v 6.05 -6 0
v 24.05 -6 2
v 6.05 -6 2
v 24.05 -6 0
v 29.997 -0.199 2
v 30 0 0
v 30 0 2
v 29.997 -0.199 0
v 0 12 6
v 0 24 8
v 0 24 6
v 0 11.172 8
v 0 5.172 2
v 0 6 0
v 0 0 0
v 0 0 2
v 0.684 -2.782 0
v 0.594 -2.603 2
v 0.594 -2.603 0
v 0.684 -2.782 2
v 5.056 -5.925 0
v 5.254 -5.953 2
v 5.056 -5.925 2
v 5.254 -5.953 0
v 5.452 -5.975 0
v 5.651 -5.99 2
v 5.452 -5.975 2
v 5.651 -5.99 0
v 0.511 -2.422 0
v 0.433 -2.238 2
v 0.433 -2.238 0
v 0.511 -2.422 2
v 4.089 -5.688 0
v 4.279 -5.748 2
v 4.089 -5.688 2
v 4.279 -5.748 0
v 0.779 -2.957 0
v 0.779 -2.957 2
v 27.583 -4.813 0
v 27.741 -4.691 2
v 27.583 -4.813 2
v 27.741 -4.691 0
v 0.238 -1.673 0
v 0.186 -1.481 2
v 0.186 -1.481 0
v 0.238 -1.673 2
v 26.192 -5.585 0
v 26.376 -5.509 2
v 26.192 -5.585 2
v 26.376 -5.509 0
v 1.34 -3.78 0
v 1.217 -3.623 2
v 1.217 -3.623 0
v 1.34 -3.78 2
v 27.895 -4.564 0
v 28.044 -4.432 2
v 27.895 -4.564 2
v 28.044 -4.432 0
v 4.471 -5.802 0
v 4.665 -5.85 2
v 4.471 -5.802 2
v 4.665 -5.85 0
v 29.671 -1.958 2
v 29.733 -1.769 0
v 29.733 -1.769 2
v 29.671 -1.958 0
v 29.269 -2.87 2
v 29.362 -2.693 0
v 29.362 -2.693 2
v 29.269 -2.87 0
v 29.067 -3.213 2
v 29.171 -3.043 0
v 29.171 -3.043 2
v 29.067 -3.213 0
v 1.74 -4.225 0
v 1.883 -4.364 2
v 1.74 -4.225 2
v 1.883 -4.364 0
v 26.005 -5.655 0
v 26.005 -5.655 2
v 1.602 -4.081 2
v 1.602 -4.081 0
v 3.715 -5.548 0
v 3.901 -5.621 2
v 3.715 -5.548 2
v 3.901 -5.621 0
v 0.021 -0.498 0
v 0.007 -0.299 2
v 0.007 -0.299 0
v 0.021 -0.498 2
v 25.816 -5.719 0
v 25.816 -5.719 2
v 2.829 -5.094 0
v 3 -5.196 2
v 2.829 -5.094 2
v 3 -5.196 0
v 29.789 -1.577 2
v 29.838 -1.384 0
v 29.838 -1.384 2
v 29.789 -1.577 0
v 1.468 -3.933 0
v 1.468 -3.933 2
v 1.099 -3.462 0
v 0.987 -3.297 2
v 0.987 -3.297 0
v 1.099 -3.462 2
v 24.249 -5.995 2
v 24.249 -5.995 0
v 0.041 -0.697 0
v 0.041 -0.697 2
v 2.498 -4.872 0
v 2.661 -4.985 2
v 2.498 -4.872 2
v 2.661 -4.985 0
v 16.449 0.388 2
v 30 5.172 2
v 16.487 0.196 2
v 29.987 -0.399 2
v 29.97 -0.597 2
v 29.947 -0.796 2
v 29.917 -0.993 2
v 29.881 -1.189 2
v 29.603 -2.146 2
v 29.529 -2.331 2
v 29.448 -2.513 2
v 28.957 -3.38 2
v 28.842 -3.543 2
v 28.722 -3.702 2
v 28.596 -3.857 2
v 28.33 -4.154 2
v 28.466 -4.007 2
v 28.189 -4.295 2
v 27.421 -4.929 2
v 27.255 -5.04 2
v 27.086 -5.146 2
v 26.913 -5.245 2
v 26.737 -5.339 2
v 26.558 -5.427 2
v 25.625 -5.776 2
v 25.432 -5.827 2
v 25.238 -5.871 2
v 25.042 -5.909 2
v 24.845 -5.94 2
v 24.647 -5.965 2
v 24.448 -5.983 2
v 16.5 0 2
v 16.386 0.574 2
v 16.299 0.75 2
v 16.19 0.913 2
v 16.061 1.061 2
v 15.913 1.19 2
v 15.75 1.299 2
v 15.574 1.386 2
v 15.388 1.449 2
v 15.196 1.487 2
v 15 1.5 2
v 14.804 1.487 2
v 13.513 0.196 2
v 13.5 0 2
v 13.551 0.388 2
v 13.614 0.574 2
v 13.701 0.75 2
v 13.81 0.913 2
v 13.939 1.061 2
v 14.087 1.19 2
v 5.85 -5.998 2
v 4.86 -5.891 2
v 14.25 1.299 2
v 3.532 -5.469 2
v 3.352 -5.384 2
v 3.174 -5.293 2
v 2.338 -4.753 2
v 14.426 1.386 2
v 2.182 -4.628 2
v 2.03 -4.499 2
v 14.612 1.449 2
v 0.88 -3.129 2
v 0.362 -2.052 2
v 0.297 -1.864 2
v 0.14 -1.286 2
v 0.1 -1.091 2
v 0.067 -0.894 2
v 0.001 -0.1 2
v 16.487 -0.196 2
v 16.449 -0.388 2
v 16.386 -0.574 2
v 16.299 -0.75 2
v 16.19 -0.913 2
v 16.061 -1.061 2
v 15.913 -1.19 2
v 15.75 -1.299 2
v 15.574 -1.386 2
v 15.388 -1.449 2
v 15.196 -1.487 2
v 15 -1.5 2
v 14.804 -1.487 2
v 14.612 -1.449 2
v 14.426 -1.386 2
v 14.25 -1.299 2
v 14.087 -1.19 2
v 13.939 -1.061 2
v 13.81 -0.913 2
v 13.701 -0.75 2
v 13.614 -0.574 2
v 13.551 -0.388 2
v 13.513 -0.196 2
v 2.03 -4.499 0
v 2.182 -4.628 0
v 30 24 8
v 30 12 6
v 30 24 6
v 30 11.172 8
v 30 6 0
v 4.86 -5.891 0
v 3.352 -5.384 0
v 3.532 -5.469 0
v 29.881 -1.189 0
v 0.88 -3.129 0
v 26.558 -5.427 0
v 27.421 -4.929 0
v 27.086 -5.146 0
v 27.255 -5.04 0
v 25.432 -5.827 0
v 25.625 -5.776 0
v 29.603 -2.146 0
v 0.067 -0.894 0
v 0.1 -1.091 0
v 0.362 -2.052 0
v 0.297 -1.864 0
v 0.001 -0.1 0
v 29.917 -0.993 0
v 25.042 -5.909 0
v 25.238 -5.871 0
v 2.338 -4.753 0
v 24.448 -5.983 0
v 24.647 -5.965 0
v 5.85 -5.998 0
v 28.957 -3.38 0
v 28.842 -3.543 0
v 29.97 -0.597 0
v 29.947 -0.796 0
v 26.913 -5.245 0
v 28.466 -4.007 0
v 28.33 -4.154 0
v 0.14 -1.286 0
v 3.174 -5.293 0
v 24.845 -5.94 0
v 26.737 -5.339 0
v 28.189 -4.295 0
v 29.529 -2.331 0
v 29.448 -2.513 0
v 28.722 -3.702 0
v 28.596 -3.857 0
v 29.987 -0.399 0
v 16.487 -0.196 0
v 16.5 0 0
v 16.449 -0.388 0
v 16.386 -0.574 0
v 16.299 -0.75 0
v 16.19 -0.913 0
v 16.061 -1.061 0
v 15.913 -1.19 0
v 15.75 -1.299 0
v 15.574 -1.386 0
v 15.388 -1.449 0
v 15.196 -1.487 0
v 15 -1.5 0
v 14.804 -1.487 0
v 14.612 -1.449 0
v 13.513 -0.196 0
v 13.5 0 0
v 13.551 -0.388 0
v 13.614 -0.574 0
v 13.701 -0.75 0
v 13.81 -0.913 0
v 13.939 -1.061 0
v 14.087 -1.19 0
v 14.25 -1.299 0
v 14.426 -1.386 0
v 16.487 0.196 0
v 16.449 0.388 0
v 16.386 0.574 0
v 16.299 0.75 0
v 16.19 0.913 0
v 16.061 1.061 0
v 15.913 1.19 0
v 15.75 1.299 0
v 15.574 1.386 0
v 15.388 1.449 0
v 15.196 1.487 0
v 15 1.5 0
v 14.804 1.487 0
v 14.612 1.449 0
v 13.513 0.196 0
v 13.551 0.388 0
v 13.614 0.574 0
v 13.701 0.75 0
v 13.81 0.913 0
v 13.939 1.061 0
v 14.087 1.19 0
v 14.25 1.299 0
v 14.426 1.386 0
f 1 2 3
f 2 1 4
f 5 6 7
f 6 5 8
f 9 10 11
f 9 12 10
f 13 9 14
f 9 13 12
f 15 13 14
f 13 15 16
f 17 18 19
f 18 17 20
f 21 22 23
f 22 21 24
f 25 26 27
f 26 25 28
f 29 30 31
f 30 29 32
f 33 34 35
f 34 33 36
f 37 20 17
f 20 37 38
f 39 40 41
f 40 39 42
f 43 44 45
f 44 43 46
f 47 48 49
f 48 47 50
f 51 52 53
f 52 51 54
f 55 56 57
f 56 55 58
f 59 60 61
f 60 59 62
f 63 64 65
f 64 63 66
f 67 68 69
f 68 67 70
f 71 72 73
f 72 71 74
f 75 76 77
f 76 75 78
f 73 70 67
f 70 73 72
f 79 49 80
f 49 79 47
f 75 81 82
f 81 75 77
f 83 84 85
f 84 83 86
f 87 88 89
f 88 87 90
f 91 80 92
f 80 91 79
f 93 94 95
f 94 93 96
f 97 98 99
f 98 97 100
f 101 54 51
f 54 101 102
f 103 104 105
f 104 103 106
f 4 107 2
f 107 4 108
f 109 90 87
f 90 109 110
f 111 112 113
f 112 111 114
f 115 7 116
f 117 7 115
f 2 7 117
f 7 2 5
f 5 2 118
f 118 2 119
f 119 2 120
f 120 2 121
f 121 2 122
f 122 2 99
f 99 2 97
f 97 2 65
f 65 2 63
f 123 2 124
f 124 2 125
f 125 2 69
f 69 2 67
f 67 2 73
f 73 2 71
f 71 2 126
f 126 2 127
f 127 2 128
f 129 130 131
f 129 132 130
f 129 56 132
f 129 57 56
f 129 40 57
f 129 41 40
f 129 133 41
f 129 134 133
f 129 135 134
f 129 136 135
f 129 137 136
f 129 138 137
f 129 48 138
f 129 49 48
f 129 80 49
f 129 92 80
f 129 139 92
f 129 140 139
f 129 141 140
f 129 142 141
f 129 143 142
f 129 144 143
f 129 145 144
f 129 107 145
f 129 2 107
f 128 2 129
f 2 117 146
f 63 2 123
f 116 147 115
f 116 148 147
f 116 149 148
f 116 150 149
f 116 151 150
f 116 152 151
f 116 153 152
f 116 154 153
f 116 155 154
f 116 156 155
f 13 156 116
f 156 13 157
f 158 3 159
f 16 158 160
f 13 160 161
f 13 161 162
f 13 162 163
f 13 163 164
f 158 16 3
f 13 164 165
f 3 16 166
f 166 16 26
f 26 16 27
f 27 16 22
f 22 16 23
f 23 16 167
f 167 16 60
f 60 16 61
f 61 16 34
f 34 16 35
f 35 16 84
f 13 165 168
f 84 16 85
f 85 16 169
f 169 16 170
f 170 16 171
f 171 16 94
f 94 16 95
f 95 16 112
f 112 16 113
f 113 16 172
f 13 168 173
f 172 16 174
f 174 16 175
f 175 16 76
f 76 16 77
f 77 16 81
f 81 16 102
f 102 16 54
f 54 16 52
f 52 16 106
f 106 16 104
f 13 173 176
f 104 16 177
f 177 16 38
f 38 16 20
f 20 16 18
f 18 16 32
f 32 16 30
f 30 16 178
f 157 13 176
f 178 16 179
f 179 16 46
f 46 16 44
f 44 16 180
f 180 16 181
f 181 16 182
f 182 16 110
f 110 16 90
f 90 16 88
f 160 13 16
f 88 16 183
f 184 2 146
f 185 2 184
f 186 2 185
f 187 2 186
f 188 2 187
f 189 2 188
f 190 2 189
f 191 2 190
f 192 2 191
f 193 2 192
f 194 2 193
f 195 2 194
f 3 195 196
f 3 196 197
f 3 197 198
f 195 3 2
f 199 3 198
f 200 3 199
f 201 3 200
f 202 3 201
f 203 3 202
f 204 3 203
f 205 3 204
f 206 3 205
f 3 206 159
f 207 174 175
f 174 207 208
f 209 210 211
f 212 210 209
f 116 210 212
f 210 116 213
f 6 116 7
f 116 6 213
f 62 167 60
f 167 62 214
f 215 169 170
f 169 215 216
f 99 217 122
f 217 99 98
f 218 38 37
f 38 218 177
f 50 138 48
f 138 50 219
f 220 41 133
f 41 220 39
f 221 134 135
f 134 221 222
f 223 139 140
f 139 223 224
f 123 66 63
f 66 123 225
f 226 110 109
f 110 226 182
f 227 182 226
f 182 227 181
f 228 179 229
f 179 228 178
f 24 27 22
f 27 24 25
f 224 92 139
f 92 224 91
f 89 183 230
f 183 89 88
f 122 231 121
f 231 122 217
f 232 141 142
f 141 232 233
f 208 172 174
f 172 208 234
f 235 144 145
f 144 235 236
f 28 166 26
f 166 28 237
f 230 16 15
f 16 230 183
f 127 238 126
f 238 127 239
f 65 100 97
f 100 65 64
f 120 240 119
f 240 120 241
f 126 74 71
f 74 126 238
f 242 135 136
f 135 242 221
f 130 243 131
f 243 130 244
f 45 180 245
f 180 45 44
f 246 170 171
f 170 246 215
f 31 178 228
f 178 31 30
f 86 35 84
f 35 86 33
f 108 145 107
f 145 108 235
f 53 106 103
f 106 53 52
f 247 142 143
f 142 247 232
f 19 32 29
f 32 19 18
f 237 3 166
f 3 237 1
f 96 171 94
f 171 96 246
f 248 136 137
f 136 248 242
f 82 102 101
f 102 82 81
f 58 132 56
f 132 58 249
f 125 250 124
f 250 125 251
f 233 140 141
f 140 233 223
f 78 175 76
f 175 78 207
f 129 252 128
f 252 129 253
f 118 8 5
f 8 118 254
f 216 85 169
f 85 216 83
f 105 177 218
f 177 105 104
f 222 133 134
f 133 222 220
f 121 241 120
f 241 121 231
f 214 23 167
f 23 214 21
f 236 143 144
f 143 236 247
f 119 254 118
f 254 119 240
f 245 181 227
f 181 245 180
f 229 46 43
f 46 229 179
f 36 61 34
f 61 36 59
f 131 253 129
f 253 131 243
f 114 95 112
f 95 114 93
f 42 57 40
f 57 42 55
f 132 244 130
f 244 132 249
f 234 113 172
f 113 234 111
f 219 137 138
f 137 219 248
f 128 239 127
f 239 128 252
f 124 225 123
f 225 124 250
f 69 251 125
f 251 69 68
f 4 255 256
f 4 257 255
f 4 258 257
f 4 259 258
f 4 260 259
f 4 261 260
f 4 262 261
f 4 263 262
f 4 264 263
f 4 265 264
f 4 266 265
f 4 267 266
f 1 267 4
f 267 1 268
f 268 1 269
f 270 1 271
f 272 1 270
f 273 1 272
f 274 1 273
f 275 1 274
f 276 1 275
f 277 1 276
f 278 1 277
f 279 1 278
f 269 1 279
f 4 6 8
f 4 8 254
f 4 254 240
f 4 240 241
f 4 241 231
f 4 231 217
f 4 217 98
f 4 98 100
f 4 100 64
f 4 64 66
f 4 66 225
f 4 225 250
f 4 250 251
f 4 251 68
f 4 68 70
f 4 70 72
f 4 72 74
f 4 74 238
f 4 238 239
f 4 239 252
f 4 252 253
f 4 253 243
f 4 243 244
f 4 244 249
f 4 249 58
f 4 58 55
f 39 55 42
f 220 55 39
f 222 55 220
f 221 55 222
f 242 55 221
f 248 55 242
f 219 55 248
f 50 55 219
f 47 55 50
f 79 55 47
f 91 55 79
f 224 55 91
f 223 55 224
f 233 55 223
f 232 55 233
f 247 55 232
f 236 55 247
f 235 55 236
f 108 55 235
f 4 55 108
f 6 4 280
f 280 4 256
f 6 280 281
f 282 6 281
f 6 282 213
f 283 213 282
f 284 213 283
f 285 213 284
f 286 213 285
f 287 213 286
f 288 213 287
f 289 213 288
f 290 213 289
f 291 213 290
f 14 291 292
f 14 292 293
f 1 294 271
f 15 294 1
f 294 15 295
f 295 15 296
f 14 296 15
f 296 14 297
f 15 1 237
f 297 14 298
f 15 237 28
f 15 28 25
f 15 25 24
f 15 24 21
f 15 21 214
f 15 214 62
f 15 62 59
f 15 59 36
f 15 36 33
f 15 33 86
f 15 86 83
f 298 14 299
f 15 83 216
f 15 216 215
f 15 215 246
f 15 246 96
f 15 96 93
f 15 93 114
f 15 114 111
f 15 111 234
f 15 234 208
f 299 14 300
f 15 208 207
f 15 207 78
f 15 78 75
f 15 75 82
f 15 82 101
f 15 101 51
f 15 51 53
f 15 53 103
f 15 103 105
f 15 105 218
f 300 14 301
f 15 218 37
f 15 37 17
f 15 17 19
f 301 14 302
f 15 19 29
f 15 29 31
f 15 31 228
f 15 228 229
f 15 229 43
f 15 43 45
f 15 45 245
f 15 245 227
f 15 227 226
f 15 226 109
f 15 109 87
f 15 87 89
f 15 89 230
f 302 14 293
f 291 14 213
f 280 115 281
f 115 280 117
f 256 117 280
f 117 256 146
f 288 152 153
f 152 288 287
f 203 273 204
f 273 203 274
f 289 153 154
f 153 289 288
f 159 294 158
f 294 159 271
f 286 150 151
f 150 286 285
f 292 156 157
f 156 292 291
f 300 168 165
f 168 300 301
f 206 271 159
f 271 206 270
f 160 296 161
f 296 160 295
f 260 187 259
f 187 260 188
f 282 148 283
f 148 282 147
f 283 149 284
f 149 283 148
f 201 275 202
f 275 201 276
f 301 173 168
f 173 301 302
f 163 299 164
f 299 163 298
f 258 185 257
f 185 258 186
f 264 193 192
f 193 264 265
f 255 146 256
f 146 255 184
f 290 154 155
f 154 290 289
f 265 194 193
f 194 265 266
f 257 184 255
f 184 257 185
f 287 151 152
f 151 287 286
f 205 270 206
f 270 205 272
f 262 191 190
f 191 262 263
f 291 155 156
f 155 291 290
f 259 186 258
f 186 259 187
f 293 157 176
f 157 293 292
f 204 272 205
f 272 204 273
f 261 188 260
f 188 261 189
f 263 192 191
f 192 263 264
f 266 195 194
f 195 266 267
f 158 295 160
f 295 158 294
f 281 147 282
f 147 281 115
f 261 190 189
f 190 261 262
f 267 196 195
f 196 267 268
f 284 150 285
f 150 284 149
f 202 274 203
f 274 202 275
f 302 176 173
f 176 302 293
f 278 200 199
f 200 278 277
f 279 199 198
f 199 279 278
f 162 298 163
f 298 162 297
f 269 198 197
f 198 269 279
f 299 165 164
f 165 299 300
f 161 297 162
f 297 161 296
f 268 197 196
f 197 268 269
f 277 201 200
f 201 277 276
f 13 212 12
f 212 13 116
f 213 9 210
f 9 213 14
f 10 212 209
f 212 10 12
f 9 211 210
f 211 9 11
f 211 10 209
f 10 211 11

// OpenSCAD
width = 30;
t = 2;
wall_offset = 6;
screw_radius = 3 / 2;
length = 12;
$fs = 0.2;
$fa = 1;

difference() {
	hull() {
		translate([length / 2, 0, 0]) {
			cylinder(h=t, r=length / 2);
		}
		translate([width - length / 2, 0, 0]) {
			cylinder(h=t, r=length / 2);
		}
		cube([width, length / 2, t]);
	}
	translate([width / 2, 0, -1]) {
		cylinder(h = t+2, r=screw_radius);
	}
}
translate([0, length / 2, 0]) {
	rotate([45, 0, 0]) {
		cube([width, wall_offset * sqrt(2) + tan(45 / 2) * t, t]);
	}
}
translate([0, length / 2 + wall_offset - tan(45 / 2) * t, wall_offset]) {
	cube([width, length + tan(45 / 2) * t, t]);
}
